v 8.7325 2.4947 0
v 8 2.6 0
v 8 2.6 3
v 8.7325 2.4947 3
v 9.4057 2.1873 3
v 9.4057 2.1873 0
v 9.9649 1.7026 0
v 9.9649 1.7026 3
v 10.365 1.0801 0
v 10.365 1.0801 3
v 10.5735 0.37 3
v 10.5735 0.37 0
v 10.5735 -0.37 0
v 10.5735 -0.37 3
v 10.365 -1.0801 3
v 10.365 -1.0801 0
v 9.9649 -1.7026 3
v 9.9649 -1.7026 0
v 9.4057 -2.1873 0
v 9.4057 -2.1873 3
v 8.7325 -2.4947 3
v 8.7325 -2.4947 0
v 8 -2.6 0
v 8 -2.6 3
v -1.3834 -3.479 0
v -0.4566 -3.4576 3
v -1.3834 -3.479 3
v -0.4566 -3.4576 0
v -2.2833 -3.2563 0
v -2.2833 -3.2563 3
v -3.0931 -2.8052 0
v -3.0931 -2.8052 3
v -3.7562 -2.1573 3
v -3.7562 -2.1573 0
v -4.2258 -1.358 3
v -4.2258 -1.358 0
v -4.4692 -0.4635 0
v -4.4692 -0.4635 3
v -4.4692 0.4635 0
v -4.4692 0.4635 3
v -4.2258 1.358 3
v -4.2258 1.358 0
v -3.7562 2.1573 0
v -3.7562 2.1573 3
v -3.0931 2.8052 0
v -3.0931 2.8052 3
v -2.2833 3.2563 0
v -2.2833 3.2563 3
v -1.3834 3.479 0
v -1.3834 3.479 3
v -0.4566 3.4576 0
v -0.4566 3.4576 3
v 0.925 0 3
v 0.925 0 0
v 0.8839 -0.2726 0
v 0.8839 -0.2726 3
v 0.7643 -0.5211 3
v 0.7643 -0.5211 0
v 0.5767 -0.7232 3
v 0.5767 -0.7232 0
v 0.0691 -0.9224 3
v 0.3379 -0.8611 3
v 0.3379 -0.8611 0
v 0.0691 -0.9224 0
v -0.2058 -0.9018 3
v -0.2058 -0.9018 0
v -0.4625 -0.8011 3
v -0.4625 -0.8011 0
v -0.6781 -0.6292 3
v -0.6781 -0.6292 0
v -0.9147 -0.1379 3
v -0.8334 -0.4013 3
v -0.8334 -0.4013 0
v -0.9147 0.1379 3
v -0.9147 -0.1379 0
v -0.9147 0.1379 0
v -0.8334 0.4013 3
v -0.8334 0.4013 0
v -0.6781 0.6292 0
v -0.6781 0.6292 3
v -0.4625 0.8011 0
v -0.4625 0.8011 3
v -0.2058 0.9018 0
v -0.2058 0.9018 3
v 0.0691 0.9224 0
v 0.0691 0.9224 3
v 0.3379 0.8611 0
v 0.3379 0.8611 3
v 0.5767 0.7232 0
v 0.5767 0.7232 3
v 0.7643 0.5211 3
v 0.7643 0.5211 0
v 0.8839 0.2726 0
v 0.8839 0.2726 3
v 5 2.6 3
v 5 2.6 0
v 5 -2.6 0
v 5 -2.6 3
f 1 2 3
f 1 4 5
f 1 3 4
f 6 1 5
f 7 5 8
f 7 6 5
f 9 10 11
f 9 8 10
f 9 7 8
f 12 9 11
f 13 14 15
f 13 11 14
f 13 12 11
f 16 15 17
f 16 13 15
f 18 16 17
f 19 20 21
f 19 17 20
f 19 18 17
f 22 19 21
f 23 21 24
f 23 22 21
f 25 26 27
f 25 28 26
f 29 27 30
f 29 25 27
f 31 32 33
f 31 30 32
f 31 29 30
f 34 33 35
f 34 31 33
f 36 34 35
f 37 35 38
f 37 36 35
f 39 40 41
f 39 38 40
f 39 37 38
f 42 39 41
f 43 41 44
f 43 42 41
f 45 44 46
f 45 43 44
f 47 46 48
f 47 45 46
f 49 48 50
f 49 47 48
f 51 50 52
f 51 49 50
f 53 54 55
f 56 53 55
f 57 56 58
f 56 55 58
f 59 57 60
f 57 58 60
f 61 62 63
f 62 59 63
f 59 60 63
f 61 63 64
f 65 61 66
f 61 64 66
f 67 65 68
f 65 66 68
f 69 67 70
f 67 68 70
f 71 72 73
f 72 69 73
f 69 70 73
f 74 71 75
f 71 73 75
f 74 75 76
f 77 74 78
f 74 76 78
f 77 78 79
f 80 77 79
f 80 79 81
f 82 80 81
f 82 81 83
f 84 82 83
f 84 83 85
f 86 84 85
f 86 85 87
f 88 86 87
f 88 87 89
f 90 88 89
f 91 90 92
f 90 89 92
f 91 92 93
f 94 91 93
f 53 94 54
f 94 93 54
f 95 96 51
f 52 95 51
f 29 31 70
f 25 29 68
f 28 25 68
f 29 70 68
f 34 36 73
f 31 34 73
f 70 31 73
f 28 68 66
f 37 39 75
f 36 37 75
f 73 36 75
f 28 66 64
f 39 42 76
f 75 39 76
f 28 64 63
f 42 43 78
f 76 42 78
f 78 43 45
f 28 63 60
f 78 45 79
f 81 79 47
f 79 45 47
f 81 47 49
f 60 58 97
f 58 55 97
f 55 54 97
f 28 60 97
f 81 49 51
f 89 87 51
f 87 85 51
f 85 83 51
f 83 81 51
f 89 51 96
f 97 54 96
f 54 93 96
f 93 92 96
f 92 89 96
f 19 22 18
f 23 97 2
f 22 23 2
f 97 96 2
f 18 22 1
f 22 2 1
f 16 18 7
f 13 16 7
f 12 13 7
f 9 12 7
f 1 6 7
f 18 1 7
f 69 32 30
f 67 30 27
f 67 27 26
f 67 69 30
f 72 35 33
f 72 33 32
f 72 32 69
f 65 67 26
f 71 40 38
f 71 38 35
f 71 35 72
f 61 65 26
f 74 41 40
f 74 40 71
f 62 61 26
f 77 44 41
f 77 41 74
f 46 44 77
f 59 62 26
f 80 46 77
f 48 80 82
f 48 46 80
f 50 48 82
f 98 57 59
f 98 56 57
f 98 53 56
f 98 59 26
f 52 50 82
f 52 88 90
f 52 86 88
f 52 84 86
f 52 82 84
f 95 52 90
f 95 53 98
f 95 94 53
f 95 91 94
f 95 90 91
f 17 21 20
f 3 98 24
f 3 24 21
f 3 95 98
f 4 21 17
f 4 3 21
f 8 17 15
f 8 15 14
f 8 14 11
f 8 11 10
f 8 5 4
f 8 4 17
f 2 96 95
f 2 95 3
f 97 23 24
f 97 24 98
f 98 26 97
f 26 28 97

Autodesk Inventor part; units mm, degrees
ref_plane "YZ Plane" through (0, 0, 0) normal (1, 0, 0) x (0, 1, 0)
ref_plane "XZ Plane" through (0, 0, 0) normal (0, 1, 0) x (-1, 0, 0)
ref_plane "XY Plane" through (0, 0, 0) normal (0, 0, 1) x (1, 0, 0)
sketch "Sketch1" plane through (0, 0, 0) normal (0, 0, 1) x (1, 0, 0)
  circle A0 centre (0, 0) radius 0.925
  line L0 (5, 2.6) -> (-0.4566, 3.4576)
  arc A1 (-0.4566, 3.4576) -> (-0.4566, -3.4576) centre (-1, 0) ccw
  line L1 (-0.4566, -3.4576) -> (5, -2.6)
  line L2 (0, 0) -> (26, 0) construction
  line L3 (5, 2.6) -> (8, 2.6)
  arc A2 (8, -2.6) -> (8, 2.6) centre (8, 0) ccw
  line L4 (8, -2.6) -> (5, -2.6)
  dimension "d0" = 1.85
  dimension "d7" = 3.5
  dimension "d8" = 1
  dimension "d10" = 2.6
  dimension "d11" = 8
  dimension "d12" = 6
extrude "Extrusion1" add sketch "Sketch1" along normal blind 3
properties part number "slider_link_p5"
